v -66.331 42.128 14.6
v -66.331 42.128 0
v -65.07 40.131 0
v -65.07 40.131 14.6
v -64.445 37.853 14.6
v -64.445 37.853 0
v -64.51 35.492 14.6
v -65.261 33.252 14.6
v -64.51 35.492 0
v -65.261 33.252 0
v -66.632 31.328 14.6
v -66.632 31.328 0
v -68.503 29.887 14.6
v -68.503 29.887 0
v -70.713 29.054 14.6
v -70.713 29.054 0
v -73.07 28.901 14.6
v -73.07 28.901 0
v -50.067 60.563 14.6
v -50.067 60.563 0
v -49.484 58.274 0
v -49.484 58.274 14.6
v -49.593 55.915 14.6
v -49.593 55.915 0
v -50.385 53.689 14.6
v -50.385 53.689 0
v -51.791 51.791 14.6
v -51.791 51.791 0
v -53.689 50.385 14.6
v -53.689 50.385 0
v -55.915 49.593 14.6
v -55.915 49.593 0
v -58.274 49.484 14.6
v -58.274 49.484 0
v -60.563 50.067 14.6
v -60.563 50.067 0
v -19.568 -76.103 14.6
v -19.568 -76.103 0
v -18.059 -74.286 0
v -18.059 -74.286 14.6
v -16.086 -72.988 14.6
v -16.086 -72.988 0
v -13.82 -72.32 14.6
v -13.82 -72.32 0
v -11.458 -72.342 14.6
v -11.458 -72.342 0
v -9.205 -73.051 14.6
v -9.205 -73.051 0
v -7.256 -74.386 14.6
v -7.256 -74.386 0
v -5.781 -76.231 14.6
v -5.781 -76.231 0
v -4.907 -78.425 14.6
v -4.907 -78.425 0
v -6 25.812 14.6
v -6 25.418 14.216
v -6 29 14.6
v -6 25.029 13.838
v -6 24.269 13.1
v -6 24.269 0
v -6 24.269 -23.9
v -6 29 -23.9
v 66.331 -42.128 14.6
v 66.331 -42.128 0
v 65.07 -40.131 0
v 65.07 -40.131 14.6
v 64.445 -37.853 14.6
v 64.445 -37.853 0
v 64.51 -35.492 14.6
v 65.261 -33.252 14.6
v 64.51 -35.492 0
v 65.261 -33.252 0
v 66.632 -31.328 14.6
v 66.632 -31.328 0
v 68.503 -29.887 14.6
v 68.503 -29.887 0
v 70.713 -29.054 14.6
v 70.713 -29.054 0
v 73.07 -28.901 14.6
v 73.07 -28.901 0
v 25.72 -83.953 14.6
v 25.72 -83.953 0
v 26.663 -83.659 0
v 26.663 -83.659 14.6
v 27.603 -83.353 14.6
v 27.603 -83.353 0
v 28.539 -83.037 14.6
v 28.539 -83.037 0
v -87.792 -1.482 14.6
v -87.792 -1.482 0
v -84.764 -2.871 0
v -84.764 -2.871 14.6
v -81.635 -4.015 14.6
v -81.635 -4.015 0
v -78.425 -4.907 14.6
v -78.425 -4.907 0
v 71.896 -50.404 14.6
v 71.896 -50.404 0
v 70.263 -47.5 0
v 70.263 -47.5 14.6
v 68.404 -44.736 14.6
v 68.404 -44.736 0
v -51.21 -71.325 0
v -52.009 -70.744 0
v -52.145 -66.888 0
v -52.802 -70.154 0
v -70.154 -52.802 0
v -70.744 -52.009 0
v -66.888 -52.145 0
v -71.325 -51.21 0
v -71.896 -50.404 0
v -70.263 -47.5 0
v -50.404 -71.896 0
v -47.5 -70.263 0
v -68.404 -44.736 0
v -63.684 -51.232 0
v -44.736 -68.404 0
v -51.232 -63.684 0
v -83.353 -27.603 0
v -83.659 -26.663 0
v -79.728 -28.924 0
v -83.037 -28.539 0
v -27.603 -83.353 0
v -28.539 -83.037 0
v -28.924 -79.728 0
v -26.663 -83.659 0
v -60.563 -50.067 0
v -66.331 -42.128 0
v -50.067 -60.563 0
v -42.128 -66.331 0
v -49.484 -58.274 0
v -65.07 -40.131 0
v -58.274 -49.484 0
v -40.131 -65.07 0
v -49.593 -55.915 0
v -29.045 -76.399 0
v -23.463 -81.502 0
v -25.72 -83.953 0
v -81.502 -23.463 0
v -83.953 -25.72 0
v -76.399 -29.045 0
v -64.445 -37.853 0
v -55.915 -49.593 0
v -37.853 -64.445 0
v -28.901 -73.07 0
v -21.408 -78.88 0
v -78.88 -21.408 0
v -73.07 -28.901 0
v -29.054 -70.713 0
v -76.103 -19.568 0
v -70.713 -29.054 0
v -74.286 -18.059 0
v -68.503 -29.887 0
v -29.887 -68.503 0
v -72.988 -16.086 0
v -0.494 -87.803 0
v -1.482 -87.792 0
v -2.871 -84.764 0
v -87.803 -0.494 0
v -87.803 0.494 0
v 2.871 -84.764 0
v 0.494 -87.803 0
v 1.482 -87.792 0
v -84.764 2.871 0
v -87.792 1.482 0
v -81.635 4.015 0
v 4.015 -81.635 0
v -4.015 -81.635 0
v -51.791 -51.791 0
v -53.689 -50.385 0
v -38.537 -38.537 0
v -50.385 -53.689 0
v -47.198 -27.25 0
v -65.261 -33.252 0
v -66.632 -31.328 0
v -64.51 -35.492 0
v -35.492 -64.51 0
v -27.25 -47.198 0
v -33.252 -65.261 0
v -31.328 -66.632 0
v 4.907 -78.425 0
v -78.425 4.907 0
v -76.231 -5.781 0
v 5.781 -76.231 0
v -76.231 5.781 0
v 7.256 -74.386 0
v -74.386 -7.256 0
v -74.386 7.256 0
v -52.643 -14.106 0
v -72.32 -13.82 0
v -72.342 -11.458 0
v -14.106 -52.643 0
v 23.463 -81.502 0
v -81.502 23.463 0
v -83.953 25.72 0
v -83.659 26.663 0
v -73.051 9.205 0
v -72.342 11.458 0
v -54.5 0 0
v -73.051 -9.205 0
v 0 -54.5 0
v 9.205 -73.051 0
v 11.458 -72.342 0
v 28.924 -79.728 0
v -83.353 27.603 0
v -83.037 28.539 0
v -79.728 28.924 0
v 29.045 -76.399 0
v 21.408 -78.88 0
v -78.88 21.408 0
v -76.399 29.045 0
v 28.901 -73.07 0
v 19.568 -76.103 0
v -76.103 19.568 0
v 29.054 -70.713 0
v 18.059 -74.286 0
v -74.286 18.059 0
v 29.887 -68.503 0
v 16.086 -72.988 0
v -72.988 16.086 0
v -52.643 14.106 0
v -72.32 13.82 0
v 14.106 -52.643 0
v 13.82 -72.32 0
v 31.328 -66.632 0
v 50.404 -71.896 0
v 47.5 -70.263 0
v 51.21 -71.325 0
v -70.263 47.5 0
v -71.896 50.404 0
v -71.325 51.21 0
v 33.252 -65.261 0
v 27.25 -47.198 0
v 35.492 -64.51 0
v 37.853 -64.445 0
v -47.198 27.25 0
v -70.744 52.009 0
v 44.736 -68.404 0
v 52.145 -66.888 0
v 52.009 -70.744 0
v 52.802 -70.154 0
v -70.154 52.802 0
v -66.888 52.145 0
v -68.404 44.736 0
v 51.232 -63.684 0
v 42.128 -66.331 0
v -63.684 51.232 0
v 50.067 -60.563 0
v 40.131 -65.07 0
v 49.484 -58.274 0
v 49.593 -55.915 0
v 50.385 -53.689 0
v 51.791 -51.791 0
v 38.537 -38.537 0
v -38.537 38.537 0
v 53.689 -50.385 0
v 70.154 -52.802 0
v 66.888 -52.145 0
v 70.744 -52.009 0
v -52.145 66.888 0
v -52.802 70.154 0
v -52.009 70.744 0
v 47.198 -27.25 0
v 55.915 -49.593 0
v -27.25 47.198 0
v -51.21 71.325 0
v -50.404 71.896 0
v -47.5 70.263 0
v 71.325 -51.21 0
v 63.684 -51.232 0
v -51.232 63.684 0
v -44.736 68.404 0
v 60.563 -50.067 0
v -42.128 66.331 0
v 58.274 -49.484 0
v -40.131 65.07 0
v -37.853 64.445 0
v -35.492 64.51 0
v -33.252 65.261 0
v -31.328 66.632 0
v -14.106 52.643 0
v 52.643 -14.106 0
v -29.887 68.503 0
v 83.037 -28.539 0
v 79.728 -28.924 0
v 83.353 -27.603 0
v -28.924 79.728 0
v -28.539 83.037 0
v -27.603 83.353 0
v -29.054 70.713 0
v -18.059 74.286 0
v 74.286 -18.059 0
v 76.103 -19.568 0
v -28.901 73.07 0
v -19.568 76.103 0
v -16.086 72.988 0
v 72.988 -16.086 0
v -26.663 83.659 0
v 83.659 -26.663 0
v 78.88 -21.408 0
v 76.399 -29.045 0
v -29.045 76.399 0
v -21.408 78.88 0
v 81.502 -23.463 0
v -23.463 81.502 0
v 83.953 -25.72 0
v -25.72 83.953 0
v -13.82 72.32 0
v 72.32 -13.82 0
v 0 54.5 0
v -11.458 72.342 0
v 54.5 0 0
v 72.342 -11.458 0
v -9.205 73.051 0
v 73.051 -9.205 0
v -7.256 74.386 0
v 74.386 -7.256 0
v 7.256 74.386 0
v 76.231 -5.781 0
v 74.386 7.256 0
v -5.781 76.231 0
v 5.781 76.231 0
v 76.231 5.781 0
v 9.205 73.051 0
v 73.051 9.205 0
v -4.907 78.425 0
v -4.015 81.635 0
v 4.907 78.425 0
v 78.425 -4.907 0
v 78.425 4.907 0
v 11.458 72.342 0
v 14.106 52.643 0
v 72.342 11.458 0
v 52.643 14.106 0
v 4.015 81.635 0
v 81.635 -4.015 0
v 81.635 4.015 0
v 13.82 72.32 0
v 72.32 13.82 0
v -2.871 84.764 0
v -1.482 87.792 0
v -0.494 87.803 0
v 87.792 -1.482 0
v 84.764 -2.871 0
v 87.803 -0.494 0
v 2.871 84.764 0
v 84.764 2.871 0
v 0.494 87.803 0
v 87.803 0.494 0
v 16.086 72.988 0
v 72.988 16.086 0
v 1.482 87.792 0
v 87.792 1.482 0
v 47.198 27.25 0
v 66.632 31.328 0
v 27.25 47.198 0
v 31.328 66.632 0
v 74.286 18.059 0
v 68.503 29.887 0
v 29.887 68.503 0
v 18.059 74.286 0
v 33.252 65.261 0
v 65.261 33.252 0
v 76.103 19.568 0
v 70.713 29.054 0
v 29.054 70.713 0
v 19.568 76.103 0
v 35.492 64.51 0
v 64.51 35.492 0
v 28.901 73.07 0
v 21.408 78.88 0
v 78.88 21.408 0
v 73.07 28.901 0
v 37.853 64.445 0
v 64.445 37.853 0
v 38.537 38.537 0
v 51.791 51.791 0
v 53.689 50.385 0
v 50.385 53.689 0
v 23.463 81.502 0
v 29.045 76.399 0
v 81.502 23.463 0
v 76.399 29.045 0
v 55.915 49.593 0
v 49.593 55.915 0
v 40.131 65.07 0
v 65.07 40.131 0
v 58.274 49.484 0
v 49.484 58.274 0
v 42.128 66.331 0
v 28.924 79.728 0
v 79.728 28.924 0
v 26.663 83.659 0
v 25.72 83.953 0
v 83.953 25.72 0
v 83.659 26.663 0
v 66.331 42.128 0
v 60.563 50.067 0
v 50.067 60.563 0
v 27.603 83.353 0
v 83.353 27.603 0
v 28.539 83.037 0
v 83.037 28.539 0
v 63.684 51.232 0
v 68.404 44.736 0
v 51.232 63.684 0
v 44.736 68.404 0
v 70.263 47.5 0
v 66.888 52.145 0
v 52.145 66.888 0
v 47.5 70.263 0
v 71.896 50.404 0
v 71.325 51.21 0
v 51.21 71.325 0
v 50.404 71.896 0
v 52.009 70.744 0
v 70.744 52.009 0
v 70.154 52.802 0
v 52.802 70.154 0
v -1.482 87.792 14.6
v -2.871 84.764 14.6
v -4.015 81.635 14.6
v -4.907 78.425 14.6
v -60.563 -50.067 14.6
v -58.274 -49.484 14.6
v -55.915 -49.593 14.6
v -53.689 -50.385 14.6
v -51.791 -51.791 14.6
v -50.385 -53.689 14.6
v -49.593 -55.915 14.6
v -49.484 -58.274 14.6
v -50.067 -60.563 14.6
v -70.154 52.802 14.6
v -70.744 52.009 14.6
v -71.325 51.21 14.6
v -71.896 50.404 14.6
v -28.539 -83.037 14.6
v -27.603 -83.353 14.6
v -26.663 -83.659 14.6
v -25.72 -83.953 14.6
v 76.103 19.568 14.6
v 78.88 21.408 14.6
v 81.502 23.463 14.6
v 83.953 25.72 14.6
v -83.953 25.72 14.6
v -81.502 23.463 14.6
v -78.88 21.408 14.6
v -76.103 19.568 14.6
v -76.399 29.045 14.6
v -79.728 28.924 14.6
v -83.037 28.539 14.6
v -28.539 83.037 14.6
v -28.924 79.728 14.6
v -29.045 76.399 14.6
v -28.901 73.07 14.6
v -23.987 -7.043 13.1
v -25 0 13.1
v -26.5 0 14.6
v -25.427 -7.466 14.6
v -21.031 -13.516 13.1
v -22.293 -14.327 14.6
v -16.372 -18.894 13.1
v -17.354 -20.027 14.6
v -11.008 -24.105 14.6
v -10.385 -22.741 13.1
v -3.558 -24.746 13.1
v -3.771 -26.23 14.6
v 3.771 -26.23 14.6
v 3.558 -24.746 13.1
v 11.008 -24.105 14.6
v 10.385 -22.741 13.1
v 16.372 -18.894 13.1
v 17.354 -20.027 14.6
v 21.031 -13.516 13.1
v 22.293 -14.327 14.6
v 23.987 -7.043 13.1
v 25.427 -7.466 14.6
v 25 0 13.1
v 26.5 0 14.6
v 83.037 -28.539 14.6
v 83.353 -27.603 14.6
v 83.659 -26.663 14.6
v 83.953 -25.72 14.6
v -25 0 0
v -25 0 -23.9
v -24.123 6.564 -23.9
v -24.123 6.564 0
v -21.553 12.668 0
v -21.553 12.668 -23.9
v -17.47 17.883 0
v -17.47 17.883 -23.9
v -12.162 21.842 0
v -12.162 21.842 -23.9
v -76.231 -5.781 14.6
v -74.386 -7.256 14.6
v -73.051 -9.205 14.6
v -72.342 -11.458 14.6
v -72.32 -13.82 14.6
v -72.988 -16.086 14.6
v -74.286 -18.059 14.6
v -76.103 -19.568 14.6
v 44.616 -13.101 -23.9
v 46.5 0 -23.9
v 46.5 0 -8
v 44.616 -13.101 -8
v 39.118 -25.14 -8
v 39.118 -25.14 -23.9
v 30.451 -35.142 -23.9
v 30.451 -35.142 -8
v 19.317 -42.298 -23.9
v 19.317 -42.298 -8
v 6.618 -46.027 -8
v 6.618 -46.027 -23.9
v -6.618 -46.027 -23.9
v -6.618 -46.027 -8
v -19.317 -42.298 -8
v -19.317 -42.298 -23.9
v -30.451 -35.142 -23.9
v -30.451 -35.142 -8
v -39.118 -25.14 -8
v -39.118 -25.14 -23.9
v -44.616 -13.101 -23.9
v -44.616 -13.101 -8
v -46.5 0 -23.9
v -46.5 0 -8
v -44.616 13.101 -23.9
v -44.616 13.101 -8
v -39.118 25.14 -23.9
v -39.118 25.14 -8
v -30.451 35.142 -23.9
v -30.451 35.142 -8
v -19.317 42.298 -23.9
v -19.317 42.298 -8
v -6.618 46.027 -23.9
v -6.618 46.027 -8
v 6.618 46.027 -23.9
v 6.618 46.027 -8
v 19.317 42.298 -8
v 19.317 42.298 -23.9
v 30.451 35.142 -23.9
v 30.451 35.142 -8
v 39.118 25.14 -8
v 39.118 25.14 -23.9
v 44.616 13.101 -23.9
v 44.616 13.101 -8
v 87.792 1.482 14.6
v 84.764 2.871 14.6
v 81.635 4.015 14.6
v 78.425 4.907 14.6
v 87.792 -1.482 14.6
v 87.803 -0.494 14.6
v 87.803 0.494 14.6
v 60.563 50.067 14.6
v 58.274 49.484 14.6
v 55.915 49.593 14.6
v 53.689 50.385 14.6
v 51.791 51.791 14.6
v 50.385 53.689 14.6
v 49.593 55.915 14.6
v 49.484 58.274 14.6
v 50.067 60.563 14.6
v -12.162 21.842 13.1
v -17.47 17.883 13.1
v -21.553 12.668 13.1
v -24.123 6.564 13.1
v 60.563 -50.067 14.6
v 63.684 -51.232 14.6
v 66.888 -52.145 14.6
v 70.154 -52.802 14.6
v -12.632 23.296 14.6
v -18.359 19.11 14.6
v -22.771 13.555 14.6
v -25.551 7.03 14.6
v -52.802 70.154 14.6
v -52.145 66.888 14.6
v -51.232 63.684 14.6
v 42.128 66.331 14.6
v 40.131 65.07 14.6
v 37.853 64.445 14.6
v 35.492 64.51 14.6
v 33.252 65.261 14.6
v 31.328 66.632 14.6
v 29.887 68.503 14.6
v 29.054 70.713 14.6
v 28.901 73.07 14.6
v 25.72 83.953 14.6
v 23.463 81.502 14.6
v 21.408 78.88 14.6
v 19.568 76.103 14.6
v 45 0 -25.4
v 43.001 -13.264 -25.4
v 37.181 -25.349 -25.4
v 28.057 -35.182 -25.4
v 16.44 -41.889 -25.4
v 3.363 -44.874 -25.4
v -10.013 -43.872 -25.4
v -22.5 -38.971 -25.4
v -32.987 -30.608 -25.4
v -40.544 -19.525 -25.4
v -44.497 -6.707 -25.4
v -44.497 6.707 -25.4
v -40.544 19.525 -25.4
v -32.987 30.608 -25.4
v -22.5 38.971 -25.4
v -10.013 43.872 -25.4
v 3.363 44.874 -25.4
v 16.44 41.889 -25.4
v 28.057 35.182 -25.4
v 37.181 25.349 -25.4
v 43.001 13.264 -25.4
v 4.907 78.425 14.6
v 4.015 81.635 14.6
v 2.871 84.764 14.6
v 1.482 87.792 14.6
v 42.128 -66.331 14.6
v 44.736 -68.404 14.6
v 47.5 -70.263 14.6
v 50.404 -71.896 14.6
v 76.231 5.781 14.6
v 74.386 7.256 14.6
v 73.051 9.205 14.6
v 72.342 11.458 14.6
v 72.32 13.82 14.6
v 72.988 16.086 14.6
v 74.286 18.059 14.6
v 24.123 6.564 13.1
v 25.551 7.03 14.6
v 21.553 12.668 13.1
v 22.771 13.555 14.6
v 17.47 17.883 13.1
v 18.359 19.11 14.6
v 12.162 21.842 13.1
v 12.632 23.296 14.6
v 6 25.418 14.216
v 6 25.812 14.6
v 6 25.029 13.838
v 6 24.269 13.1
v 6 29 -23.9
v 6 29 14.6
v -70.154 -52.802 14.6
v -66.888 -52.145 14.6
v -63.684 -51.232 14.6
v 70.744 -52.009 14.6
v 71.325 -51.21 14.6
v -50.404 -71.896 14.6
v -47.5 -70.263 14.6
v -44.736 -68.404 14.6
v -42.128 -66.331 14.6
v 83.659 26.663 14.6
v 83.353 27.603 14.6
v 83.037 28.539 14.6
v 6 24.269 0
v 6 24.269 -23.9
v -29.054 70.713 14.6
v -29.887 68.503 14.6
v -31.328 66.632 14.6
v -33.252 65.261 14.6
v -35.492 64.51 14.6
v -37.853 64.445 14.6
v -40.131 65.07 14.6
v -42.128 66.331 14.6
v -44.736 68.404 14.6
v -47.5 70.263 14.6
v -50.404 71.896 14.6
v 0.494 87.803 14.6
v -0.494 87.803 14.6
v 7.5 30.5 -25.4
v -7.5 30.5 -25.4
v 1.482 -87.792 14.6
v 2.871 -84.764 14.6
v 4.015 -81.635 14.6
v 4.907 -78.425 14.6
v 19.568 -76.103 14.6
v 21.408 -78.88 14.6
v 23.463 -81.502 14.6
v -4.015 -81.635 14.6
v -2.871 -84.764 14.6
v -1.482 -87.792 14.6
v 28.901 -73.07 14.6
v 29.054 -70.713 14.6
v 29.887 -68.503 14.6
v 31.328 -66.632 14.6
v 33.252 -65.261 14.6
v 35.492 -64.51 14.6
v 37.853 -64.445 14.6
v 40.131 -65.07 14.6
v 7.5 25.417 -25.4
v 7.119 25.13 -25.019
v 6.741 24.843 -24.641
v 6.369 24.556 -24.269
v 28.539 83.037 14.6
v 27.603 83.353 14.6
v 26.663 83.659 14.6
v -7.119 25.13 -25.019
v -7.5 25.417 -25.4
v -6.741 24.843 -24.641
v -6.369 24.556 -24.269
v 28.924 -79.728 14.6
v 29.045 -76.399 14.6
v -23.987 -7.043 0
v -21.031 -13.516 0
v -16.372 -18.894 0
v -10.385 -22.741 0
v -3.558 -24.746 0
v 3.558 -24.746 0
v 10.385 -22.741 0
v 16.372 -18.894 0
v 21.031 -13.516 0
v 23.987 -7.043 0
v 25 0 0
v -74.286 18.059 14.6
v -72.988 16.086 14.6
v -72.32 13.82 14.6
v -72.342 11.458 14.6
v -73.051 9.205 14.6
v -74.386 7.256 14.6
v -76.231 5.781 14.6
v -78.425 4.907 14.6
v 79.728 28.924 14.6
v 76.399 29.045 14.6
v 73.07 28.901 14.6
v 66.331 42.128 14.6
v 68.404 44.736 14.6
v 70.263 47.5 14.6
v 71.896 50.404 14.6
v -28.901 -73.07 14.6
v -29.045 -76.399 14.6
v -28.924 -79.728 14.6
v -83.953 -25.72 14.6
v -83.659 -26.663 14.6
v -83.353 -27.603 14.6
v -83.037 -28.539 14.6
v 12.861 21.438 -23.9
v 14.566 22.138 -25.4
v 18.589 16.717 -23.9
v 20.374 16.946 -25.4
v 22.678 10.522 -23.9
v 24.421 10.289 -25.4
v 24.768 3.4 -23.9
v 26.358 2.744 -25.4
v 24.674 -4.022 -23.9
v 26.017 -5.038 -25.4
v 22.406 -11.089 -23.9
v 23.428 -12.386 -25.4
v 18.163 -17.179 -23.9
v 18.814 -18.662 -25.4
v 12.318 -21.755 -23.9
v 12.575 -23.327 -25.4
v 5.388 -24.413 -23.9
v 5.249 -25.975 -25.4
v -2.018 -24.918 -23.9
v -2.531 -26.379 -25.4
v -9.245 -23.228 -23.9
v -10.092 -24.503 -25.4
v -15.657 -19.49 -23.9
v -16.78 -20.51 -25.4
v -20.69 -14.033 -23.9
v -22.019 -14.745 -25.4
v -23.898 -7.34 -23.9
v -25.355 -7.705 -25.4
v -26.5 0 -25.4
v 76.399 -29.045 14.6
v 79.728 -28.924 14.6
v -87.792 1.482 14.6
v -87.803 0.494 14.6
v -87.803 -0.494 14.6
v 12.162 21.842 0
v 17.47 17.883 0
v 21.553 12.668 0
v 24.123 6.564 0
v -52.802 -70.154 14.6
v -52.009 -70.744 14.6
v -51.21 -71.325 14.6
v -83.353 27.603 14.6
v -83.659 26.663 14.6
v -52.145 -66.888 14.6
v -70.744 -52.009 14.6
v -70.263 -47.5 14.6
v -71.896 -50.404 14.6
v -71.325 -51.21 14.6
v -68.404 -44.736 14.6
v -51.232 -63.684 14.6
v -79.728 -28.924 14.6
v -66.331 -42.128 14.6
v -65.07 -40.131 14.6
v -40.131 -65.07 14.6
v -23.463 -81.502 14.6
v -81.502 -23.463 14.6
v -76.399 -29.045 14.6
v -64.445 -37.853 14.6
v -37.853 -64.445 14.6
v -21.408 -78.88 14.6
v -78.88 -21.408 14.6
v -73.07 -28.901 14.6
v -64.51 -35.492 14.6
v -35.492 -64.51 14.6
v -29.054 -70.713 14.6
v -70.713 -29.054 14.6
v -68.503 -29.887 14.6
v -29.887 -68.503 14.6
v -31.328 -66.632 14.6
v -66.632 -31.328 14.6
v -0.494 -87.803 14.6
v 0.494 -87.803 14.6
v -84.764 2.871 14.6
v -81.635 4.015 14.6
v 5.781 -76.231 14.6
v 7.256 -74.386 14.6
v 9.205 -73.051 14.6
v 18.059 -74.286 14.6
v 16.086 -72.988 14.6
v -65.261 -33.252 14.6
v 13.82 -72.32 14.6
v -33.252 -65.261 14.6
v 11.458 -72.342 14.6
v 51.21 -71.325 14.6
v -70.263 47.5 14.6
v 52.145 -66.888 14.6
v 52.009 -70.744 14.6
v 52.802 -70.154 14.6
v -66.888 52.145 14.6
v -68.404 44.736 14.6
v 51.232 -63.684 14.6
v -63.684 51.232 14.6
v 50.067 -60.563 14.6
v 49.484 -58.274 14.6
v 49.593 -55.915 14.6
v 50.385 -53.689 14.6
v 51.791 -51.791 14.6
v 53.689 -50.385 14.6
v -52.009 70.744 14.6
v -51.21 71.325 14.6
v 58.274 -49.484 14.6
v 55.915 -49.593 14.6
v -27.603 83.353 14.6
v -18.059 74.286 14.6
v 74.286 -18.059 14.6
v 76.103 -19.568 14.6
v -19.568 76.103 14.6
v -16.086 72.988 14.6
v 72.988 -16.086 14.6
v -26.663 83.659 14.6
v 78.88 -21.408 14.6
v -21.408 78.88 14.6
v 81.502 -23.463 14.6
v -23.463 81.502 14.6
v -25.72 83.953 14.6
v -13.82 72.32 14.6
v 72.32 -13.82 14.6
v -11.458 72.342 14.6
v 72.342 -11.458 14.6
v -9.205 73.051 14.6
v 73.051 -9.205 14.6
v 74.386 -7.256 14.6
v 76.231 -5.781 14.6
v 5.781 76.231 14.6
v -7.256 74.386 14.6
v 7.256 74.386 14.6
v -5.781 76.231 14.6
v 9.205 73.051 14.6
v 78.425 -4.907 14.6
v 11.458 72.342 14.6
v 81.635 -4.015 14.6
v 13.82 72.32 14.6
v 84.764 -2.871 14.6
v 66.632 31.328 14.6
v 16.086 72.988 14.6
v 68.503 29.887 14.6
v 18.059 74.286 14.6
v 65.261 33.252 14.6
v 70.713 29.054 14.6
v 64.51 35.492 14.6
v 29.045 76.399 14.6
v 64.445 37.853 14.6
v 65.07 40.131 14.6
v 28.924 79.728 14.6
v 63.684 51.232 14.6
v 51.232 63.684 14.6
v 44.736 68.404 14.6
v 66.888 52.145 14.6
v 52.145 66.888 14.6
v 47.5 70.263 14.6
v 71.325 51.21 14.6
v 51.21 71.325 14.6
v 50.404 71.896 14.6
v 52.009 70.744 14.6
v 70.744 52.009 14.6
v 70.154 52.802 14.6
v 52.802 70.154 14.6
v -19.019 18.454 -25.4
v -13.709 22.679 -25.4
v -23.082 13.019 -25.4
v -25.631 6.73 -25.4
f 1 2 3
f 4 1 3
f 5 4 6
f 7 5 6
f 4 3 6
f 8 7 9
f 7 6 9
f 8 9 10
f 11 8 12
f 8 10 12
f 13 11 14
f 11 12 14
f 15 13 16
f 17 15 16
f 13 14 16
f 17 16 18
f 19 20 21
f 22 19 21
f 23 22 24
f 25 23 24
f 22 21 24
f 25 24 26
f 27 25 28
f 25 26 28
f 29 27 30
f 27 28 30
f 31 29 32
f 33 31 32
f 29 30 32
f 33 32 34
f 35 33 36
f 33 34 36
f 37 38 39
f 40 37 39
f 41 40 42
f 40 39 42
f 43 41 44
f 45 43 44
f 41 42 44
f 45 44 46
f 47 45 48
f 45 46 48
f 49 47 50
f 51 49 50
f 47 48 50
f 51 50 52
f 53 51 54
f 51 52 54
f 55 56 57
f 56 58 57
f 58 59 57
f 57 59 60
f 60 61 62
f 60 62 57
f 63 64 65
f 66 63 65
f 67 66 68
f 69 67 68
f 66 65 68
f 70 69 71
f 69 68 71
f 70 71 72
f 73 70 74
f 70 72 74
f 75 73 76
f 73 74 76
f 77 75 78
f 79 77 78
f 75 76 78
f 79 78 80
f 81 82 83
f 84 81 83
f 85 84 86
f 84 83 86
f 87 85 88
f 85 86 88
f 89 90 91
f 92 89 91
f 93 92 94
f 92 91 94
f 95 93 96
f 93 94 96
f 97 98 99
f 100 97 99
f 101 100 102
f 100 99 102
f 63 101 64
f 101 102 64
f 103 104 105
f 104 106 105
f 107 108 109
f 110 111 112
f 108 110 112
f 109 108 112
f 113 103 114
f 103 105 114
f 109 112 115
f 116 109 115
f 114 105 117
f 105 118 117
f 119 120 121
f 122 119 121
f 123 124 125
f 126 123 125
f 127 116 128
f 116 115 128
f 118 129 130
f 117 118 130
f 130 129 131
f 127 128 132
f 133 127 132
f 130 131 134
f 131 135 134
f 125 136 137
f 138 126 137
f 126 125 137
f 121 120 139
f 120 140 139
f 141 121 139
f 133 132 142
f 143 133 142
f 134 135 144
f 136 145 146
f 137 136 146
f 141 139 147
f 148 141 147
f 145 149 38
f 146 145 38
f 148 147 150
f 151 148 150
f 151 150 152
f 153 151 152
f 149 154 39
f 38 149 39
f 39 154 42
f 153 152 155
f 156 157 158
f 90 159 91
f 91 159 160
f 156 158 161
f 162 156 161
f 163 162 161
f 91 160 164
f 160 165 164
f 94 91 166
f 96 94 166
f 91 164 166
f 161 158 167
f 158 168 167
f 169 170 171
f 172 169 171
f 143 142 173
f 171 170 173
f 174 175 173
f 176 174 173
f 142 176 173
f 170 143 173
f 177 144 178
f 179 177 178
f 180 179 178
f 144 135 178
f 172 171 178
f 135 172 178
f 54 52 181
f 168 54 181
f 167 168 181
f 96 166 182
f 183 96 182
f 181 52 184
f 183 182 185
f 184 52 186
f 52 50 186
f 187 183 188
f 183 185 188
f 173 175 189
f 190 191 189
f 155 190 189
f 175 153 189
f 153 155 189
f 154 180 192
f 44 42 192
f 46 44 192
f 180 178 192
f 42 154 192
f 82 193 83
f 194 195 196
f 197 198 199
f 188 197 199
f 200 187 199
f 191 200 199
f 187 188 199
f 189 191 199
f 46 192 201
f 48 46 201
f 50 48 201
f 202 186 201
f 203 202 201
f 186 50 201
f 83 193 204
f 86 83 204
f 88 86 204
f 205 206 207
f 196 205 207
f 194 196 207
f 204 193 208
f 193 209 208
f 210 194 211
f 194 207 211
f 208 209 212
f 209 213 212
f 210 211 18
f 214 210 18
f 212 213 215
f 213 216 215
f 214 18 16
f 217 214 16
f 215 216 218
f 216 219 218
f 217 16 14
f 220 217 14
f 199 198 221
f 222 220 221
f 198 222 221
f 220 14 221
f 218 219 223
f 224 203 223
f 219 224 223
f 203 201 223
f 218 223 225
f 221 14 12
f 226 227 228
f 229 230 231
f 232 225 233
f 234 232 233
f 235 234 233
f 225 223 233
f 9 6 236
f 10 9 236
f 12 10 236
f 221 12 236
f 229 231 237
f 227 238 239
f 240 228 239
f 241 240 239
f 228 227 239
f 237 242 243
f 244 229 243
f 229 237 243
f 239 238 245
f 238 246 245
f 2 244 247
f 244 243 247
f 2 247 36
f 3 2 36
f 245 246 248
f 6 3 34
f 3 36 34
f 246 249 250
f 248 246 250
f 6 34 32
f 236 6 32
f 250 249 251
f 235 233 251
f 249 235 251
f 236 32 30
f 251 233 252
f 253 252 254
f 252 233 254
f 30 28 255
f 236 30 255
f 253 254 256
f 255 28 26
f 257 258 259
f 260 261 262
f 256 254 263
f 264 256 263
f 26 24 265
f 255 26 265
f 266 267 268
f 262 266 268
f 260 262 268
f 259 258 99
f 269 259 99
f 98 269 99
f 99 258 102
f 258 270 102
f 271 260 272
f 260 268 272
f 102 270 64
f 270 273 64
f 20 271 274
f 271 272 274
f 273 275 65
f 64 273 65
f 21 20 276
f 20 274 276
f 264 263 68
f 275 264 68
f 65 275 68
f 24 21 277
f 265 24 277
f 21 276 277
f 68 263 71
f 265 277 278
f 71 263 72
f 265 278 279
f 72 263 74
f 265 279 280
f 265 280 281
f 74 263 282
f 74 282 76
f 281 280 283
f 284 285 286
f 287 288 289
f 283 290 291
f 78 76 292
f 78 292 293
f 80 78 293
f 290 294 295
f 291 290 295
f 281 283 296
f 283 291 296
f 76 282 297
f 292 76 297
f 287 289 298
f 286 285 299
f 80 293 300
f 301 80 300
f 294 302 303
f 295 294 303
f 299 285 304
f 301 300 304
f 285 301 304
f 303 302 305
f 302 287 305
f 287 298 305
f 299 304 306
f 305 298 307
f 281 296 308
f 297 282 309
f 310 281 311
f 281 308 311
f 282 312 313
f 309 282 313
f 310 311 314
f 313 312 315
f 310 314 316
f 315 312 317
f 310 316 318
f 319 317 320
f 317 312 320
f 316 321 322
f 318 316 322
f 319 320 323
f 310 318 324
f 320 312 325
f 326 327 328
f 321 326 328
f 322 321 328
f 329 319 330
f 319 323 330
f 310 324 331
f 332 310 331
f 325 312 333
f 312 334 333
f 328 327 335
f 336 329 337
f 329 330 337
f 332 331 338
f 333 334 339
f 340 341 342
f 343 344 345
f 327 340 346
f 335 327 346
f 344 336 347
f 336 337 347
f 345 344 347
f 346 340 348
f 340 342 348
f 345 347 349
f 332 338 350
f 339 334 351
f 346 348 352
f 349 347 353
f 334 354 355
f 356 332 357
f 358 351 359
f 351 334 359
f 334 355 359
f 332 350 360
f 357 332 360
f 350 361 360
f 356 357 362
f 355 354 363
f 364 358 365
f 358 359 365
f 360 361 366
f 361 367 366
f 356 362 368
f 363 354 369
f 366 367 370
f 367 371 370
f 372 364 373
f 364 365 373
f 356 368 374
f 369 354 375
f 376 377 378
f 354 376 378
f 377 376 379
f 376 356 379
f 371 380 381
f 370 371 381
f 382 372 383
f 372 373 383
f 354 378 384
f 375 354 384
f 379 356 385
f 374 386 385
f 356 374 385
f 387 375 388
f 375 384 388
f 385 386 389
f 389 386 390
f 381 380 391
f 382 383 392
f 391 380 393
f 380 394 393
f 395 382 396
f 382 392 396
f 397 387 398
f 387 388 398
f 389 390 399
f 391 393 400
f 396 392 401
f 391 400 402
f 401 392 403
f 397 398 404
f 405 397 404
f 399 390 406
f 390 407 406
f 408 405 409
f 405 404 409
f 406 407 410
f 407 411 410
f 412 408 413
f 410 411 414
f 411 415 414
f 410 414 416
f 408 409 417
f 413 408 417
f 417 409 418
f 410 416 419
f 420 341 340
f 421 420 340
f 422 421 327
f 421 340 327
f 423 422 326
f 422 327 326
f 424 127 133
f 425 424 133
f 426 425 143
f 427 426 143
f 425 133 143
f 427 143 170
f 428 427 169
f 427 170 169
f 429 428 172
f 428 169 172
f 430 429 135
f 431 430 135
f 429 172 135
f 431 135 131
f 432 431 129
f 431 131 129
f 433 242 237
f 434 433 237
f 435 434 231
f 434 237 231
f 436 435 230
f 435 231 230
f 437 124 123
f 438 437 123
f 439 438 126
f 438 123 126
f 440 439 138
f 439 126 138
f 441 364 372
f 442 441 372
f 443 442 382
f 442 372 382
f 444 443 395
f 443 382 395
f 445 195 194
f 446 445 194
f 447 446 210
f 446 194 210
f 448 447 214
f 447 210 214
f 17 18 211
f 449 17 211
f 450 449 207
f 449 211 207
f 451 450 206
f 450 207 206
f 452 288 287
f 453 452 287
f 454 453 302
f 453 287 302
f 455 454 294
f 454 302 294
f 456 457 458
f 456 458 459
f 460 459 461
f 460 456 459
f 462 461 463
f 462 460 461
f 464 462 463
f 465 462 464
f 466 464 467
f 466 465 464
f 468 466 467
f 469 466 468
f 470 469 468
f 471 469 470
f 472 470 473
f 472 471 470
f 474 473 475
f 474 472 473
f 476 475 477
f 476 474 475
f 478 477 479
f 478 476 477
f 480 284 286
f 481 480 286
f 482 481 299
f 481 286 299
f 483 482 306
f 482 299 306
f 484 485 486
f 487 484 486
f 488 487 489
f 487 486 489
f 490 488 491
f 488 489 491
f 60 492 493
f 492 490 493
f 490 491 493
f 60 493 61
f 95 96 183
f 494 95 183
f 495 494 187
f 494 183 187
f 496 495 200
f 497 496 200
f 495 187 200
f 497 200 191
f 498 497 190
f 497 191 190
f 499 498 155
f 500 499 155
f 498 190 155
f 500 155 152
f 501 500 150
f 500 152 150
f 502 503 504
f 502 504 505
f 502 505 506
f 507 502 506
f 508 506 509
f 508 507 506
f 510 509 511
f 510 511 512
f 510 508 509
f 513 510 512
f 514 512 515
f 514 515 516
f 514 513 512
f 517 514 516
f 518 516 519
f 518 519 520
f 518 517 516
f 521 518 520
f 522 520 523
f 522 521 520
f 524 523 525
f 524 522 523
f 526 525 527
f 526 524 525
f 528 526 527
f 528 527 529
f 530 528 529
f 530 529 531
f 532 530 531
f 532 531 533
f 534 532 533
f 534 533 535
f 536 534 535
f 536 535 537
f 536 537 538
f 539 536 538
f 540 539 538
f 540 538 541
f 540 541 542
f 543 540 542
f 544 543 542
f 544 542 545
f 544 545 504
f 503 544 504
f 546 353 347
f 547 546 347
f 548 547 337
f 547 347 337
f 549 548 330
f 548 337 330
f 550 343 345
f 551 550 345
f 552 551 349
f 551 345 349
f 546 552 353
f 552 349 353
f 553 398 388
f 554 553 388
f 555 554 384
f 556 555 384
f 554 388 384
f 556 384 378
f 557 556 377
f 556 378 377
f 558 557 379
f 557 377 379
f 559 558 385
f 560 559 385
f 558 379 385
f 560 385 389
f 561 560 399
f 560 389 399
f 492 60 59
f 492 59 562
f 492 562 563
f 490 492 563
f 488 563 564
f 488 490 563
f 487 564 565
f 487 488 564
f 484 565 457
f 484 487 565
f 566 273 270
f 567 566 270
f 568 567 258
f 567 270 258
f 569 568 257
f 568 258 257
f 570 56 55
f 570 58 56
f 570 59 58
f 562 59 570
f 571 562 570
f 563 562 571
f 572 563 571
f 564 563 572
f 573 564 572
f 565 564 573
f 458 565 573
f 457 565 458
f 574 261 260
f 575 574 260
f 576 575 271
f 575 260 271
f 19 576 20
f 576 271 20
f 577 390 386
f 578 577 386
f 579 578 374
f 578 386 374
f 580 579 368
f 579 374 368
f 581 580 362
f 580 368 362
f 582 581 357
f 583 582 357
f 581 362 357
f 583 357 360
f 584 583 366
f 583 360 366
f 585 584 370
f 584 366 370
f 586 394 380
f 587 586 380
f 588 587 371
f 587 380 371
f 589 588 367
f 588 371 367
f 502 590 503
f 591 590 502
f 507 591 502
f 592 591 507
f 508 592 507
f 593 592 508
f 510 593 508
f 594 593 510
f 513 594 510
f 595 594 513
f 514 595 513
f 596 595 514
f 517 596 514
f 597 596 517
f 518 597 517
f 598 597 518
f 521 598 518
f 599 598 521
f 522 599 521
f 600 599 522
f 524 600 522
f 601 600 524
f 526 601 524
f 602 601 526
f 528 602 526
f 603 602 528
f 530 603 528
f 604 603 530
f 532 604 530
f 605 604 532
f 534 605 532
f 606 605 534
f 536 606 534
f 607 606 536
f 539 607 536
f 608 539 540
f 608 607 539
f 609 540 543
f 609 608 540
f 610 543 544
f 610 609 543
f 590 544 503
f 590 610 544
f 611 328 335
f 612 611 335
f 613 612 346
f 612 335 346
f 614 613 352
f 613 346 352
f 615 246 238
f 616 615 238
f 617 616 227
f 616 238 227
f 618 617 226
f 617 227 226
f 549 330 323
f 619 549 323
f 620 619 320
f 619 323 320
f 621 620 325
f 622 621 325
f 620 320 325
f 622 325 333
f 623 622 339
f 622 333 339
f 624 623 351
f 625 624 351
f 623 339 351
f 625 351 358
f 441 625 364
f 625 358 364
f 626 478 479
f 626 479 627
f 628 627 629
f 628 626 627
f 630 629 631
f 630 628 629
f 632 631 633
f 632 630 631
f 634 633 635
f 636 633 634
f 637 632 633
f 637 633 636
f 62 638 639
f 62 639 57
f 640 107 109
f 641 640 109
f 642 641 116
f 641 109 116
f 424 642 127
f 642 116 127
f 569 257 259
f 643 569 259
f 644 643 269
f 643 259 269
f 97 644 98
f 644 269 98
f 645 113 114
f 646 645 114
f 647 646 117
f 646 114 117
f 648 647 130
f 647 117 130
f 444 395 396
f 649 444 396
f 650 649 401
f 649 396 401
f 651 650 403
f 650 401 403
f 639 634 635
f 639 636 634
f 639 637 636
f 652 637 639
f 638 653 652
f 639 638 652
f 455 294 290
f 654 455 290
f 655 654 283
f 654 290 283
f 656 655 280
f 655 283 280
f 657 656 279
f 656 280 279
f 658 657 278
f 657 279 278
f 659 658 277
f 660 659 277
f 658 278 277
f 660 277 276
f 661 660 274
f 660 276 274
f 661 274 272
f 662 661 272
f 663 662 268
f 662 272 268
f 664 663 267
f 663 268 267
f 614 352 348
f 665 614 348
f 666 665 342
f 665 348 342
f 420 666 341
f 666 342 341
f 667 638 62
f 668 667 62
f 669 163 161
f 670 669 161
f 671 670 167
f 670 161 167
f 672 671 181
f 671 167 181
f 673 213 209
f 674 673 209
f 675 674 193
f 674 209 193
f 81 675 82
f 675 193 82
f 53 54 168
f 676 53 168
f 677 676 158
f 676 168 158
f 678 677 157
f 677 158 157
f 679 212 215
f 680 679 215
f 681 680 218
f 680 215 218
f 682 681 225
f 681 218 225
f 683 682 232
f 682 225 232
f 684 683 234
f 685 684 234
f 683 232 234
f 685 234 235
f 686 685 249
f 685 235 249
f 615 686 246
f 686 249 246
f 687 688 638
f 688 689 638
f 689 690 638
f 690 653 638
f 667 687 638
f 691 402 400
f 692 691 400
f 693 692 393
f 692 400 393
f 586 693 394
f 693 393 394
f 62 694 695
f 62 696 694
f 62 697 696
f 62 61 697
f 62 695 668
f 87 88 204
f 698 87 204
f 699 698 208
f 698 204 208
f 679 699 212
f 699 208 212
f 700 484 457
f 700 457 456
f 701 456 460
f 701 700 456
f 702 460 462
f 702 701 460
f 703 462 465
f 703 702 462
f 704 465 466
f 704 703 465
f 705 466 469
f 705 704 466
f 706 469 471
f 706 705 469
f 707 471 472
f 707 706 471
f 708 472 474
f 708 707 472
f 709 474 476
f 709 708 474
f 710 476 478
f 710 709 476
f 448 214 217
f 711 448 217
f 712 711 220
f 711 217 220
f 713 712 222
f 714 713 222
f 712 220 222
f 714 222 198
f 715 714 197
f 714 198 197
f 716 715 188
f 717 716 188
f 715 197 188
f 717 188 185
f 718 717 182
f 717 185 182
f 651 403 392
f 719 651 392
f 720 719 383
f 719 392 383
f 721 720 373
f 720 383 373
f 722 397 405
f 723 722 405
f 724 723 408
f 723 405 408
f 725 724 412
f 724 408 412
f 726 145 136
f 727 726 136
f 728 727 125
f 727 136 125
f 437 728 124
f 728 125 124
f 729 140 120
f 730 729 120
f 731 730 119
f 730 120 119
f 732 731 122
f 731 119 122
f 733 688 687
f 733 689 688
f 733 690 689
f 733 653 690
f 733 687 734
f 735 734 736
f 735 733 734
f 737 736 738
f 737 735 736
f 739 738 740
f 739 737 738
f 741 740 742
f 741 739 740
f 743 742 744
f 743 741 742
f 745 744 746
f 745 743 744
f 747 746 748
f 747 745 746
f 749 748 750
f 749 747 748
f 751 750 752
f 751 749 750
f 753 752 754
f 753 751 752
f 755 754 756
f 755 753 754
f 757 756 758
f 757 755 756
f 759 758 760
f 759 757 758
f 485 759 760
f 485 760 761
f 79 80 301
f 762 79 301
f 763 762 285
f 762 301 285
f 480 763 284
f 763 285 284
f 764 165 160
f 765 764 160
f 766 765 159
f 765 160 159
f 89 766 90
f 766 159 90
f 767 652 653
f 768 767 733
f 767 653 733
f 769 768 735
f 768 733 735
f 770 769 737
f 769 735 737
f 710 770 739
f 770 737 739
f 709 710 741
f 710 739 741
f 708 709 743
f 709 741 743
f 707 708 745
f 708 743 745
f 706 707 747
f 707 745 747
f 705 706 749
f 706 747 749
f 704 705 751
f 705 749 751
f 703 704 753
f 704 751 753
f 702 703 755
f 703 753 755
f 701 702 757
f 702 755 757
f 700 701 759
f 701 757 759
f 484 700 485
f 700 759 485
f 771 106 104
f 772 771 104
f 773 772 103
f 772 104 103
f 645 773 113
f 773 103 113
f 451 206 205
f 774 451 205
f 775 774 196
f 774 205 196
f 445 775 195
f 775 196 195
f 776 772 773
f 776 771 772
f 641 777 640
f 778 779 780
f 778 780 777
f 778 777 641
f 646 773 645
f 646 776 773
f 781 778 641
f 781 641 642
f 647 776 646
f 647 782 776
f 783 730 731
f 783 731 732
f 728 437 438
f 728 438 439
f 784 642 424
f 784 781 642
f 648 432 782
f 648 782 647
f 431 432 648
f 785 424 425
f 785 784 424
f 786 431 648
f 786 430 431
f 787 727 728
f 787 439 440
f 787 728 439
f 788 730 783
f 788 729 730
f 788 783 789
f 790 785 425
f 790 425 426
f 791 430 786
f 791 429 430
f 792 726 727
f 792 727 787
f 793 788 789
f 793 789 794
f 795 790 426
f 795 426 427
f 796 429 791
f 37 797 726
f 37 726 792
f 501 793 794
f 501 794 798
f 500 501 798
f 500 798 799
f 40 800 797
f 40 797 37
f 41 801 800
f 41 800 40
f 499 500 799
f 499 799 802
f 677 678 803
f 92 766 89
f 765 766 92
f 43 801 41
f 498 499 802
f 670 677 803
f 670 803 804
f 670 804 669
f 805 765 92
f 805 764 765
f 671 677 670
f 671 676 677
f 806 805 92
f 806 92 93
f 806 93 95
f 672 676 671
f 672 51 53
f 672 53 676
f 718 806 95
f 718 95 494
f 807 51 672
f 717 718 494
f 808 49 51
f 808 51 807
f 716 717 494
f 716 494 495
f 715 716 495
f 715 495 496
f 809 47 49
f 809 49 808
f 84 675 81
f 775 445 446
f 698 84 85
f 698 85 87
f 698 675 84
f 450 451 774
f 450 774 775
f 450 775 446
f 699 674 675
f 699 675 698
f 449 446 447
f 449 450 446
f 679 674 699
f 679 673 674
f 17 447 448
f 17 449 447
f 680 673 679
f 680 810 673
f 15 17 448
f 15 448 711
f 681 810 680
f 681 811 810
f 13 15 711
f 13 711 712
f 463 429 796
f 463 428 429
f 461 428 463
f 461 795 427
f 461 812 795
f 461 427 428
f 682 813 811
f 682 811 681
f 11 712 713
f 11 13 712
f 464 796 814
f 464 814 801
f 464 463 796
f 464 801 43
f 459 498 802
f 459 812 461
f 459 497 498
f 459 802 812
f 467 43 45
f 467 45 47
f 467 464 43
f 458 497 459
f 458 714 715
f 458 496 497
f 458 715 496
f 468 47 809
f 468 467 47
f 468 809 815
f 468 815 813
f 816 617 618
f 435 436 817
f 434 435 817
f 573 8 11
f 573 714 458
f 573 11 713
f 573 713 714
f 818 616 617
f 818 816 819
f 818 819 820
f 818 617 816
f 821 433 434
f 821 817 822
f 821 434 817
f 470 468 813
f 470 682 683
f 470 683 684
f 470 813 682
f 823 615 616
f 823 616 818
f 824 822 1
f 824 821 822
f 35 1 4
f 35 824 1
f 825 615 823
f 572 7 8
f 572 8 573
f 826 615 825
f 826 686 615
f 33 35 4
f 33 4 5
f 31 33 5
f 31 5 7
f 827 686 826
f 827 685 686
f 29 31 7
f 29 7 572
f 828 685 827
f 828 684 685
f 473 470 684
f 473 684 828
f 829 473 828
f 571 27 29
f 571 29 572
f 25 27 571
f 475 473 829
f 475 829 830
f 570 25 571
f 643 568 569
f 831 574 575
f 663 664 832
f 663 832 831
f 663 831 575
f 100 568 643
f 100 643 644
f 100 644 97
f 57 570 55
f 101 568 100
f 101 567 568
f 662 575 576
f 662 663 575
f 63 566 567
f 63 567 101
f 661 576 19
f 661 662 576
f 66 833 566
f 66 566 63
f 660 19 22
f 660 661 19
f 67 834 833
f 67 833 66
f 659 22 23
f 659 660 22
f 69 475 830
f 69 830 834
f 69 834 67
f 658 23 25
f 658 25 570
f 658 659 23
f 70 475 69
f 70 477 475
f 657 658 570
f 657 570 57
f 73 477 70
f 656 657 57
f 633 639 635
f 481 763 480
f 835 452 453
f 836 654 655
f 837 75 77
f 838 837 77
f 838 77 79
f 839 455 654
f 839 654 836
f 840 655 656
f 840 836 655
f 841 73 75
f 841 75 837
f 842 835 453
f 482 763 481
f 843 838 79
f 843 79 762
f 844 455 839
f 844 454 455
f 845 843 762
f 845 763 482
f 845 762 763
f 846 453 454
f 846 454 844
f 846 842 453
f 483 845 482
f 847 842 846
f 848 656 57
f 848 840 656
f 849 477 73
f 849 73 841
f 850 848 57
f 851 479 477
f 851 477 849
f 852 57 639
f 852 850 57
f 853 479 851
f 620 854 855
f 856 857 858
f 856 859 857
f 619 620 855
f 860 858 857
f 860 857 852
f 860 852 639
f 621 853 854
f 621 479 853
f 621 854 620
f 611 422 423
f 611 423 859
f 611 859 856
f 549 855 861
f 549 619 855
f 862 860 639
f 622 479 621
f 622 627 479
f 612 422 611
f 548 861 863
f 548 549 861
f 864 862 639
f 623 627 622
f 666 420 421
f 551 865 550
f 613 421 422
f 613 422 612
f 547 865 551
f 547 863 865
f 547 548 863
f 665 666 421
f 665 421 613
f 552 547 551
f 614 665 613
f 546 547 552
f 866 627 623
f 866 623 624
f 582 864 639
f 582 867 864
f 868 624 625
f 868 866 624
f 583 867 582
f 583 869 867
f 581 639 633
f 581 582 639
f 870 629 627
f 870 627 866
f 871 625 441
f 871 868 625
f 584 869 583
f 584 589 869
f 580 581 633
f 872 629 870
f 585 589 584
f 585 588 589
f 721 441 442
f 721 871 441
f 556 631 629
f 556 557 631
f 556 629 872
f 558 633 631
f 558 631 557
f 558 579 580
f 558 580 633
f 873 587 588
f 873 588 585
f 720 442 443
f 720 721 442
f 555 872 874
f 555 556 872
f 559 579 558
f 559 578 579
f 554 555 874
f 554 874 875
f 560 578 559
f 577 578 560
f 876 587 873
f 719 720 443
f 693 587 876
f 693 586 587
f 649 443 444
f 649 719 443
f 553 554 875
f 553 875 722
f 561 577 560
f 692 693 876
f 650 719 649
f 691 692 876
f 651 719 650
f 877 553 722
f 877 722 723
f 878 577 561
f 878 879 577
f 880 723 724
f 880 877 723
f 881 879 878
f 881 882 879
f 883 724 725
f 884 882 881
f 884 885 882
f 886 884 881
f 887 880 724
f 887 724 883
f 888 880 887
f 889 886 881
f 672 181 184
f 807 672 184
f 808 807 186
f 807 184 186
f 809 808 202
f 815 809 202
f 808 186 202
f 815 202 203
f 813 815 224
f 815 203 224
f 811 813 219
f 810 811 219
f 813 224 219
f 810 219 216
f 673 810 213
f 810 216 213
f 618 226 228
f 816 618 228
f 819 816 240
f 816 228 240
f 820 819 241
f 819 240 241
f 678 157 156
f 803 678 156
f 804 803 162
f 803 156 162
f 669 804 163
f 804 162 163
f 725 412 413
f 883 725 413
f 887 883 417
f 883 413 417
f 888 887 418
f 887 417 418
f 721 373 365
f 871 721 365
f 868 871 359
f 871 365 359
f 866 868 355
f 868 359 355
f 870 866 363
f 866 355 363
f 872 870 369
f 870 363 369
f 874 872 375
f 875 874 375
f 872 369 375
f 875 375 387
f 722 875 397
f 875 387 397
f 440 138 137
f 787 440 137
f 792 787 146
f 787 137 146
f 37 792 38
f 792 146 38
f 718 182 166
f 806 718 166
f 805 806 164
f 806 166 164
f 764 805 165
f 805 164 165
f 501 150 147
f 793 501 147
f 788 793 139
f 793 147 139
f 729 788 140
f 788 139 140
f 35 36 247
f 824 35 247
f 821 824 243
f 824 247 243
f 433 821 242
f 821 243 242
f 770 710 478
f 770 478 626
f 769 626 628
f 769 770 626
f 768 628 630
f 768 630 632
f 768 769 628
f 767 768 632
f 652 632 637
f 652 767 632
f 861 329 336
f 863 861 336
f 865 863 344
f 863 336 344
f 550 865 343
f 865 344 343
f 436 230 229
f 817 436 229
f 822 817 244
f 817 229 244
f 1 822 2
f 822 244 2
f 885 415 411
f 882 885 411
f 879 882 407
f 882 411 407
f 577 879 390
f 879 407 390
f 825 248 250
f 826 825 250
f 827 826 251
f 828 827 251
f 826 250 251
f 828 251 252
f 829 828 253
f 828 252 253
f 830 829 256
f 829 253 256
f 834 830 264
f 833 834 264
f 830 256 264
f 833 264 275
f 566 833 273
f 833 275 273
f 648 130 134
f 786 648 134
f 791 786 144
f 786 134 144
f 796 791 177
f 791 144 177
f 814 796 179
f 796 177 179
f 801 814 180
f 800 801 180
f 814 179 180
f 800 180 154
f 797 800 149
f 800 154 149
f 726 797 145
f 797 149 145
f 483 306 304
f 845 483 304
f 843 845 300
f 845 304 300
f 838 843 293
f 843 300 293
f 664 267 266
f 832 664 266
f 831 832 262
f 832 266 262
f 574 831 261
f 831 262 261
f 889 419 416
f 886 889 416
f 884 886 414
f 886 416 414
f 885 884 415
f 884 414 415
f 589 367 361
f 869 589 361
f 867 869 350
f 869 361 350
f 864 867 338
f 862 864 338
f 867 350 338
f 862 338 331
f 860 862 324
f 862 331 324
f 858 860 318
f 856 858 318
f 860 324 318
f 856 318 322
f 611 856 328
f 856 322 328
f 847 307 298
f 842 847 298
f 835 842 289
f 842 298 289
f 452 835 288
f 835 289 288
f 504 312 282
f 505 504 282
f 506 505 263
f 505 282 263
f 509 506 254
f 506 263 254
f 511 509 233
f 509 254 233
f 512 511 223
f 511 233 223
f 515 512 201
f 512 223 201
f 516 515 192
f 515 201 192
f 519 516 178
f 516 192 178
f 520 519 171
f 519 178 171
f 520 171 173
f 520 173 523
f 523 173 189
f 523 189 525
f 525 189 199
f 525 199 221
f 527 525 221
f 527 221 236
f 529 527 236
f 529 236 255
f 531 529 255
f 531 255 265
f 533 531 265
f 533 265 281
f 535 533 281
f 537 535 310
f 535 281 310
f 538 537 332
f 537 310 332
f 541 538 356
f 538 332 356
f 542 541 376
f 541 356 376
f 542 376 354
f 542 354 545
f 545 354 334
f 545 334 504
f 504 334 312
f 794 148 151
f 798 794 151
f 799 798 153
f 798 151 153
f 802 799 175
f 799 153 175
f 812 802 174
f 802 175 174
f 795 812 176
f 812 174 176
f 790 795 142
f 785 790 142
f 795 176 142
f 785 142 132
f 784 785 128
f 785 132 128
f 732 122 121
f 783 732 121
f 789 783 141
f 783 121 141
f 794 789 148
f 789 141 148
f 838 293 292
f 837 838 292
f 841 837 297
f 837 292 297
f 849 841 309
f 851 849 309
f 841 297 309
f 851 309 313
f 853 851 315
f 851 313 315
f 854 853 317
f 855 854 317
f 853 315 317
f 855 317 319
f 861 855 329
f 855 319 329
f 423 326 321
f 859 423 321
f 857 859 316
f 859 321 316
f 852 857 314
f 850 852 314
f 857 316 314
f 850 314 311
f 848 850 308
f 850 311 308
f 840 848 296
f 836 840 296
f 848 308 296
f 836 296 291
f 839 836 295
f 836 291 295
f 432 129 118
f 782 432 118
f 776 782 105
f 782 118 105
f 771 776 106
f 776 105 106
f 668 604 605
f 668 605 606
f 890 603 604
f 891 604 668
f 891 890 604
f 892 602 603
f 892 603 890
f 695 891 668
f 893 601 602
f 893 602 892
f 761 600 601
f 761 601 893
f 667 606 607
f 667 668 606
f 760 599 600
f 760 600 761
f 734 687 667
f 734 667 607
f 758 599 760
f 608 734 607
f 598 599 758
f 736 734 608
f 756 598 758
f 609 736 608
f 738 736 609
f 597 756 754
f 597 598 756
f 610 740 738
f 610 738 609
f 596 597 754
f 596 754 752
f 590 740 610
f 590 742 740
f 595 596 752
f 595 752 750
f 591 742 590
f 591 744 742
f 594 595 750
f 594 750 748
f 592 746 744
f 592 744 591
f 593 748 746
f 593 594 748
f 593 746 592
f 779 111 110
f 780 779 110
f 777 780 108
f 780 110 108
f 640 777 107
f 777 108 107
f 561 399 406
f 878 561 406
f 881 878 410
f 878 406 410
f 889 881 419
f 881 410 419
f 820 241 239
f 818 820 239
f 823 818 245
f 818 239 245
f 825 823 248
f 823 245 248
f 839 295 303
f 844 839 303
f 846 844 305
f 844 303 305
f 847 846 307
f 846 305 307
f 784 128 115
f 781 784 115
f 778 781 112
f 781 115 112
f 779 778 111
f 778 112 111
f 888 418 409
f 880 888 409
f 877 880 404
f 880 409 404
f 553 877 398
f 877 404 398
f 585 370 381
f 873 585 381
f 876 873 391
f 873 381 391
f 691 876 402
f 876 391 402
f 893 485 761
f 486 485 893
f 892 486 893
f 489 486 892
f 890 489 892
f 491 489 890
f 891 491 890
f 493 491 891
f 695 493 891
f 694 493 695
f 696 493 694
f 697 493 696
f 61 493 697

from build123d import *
from build123d.topology import SkipClean

# Parameters (mm, degrees)
SKETCH2_R           = 25
BOSS_EXTRUDE1_DEPTH = 14.6
BOSS_EXTRUDE2_START = 40
SKETCH3_R           = 46.5
SKETCH3_R_2         = 25
BOSS_EXTRUDE2_DEPTH = 40
SKETCH6_W           = 12
SKETCH6_H           = 17.793467461
CUT_EXTRUDE1_DEPTH  = 64
CHAMFER1_SIZE       = 1.5
CHAMFER2_SIZE       = 8


with BuildPart() as part:
    # Sketch2 → Boss-Extrude1 (new body)
    with BuildSketch(Plane.XY):
        with BuildLine():
            ThreePointArc((-52.801936247, 70.154195014), (-51.720450563, 65.277064388), (-50.066512977, 60.563201335))
            ThreePointArc((-50.066512977, 60.563201335), (-51.791439328, 51.791439328), (-60.563201335, 50.066512977))
            ThreePointArc((-60.563201335, 50.066512977), (-65.277064388, 51.720450563), (-70.154195014, 52.801936247))
            ThreePointArc((-70.154195014, 52.801936247), (-71.035449372, 51.610274965), (-71.896464027, 50.403908677))
            ThreePointArc((-71.896464027, 50.403908677), (-69.360793773, 46.09967927), (-66.331141862, 42.127623919))
            ThreePointArc((-66.331141862, 42.127623919), (-65.261020777, 33.252150946), (-73.070430637, 28.901024969))
            ThreePointArc((-73.070430637, 28.901024969), (-78.064675632, 29.017349295), (-83.03729995, 28.538787055))
            ThreePointArc((-83.03729995, 28.538787055), (-83.507179062, 27.133127254), (-83.953264975, 25.719736574))
            ThreePointArc((-83.953264975, 25.719736574), (-80.211619223, 22.40973635), (-76.102816424, 19.568301152))
            ThreePointArc((-76.102816424, 19.568301152), (-72.342398812, 11.457910348), (-78.425017076, 4.906503271))
            ThreePointArc((-78.425017076, 4.906503271), (-83.210772516, 3.473827702), (-87.792135411, 1.482062544))
            ThreePointArc((-87.792135411, 1.482062544), (-87.804644236, 0), (-87.792135411, -1.482062544))
            ThreePointArc((-87.792135411, -1.482062544), (-83.210772516, -3.473827702), (-78.425017076, -4.906503271))
            ThreePointArc((-78.425017076, -4.906503271), (-72.342398812, -11.457910348), (-76.102816424, -19.568301152))
            ThreePointArc((-76.102816424, -19.568301152), (-80.211619223, -22.40973635), (-83.953264975, -25.719736574))
            ThreePointArc((-83.953264975, -25.719736574), (-83.507179062, -27.133127254), (-83.03729995, -28.538787055))
            ThreePointArc((-83.03729995, -28.538787055), (-78.064675632, -29.017349295), (-73.070430637, -28.901024969))
            ThreePointArc((-73.070430637, -28.901024969), (-65.261020777, -33.252150946), (-66.331141862, -42.127623918))
            ThreePointArc((-66.331141862, -42.127623918), (-69.360793773, -46.09967927), (-71.896464027, -50.403908677))
            ThreePointArc((-71.896464027, -50.403908677), (-71.035449372, -51.610274965), (-70.154195014, -52.801936247))
            ThreePointArc((-70.154195014, -52.801936247), (-65.277064388, -51.720450563), (-60.563201335, -50.066512977))
            ThreePointArc((-60.563201335, -50.066512977), (-51.791439328, -51.791439328), (-50.066512977, -60.563201335))
            ThreePointArc((-50.066512977, -60.563201335), (-51.720450563, -65.277064388), (-52.801936247, -70.154195014))
            ThreePointArc((-52.801936247, -70.154195014), (-51.610274965, -71.035449372), (-50.403908677, -71.896464027))
            ThreePointArc((-50.403908677, -71.896464027), (-46.09967927, -69.360793773), (-42.127623918, -66.331141861))
            ThreePointArc((-42.127623918, -66.331141861), (-33.252150946, -65.261020777), (-28.901024969, -73.070430637))
            ThreePointArc((-28.901024969, -73.070430637), (-29.017349295, -78.064675632), (-28.538787055, -83.03729995))
            ThreePointArc((-28.538787055, -83.03729995), (-27.133127254, -83.507179062), (-25.719736574, -83.953264975))
            ThreePointArc((-25.719736574, -83.953264975), (-22.40973635, -80.211619223), (-19.568301152, -76.102816424))
            ThreePointArc((-19.568301152, -76.102816424), (-11.457910348, -72.342398812), (-4.906503271, -78.425017076))
            ThreePointArc((-4.906503271, -78.425017076), (-3.473827702, -83.210772516), (-1.482062544, -87.792135411))
            ThreePointArc((-1.482062544, -87.792135411), (0, -87.804644236), (1.482062544, -87.792135411))
            ThreePointArc((1.482062544, -87.792135411), (3.473827702, -83.210772516), (4.906503271, -78.425017076))
            ThreePointArc((4.906503271, -78.425017076), (11.457910348, -72.342398812), (19.568301152, -76.102816424))
            ThreePointArc((19.568301152, -76.102816424), (22.40973635, -80.211619223), (25.719736574, -83.953264975))
            ThreePointArc((25.719736574, -83.953264975), (27.133127254, -83.507179062), (28.538787055, -83.03729995))
            ThreePointArc((28.538787055, -83.03729995), (29.017349295, -78.064675632), (28.901024969, -73.070430637))
            ThreePointArc((28.901024969, -73.070430637), (33.252150946, -65.261020777), (42.127623918, -66.331141861))
            ThreePointArc((42.127623918, -66.331141861), (46.09967927, -69.360793773), (50.403908677, -71.896464027))
            ThreePointArc((50.403908677, -71.896464027), (51.610274965, -71.035449372), (52.801936247, -70.154195014))
            ThreePointArc((52.801936247, -70.154195014), (51.720450563, -65.277064388), (50.066512977, -60.563201335))
            ThreePointArc((50.066512977, -60.563201335), (51.791439328, -51.791439328), (60.563201335, -50.066512977))
            ThreePointArc((60.563201335, -50.066512977), (65.277064388, -51.720450563), (70.154195014, -52.801936247))
            ThreePointArc((70.154195014, -52.801936247), (71.035449372, -51.610274965), (71.896464027, -50.403908677))
            ThreePointArc((71.896464027, -50.403908677), (69.360793773, -46.09967927), (66.331141862, -42.127623919))
            ThreePointArc((66.331141862, -42.127623919), (65.261020777, -33.252150946), (73.070430637, -28.901024969))
            ThreePointArc((73.070430637, -28.901024969), (78.064675632, -29.017349295), (83.03729995, -28.538787055))
            ThreePointArc((83.03729995, -28.538787055), (83.507179062, -27.133127254), (83.953264975, -25.719736574))
            ThreePointArc((83.953264975, -25.719736574), (80.211619223, -22.40973635), (76.102816424, -19.568301152))
            ThreePointArc((76.102816424, -19.568301152), (72.342398812, -11.457910348), (78.425017076, -4.906503271))
            ThreePointArc((78.425017076, -4.906503271), (83.210772516, -3.473827702), (87.792135411, -1.482062544))
            ThreePointArc((87.792135411, -1.482062544), (87.804644236, 0), (87.792135411, 1.482062544))
            ThreePointArc((87.792135411, 1.482062544), (83.210772516, 3.473827702), (78.425017076, 4.906503271))
            ThreePointArc((78.425017076, 4.906503271), (72.342398812, 11.457910348), (76.102816424, 19.568301152))
            ThreePointArc((76.102816424, 19.568301152), (80.211619223, 22.40973635), (83.953264975, 25.719736575))
            ThreePointArc((83.953264975, 25.719736575), (83.507179062, 27.133127254), (83.03729995, 28.538787055))
            ThreePointArc((83.03729995, 28.538787055), (78.064675632, 29.017349295), (73.070430637, 28.901024969))
            ThreePointArc((73.070430637, 28.901024969), (65.261020777, 33.252150946), (66.331141862, 42.127623918))
            ThreePointArc((66.331141862, 42.127623918), (69.360793773, 46.09967927), (71.896464027, 50.403908677))
            ThreePointArc((71.896464027, 50.403908677), (71.035449372, 51.610274965), (70.154195014, 52.801936247))
            ThreePointArc((70.154195014, 52.801936247), (65.277064388, 51.720450563), (60.563201335, 50.066512977))
            ThreePointArc((60.563201335, 50.066512977), (51.791439328, 51.791439328), (50.066512977, 60.563201335))
            ThreePointArc((50.066512977, 60.563201335), (51.720450563, 65.277064388), (52.801936247, 70.154195014))
            ThreePointArc((52.801936247, 70.154195014), (51.610274965, 71.035449372), (50.403908677, 71.896464027))
            ThreePointArc((50.403908677, 71.896464027), (46.09967927, 69.360793773), (42.127623918, 66.331141861))
            ThreePointArc((42.127623918, 66.331141861), (33.252150946, 65.261020777), (28.901024969, 73.070430637))
            ThreePointArc((28.901024969, 73.070430637), (29.017349295, 78.064675632), (28.538787055, 83.03729995))
            ThreePointArc((28.538787055, 83.03729995), (27.133127254, 83.507179062), (25.719736574, 83.953264975))
            ThreePointArc((25.719736574, 83.953264975), (22.40973635, 80.211619223), (19.568301152, 76.102816424))
            ThreePointArc((19.568301152, 76.102816424), (11.457910348, 72.342398812), (4.906503271, 78.425017076))
            ThreePointArc((4.906503271, 78.425017076), (3.473827702, 83.210772516), (1.482062544, 87.792135411))
            ThreePointArc((1.482062544, 87.792135411), (0, 87.804644236), (-1.482062544, 87.792135411))
            ThreePointArc((-1.482062544, 87.792135411), (-3.473827702, 83.210772516), (-4.906503271, 78.425017076))
            ThreePointArc((-4.906503271, 78.425017076), (-11.457910348, 72.342398812), (-19.568301152, 76.102816424))
            ThreePointArc((-19.568301152, 76.102816424), (-22.40973635, 80.211619223), (-25.719736574, 83.953264975))
            ThreePointArc((-25.719736574, 83.953264975), (-27.133127254, 83.507179062), (-28.538787055, 83.03729995))
            ThreePointArc((-28.538787055, 83.03729995), (-29.017349295, 78.064675632), (-28.901024969, 73.070430637))
            ThreePointArc((-28.901024969, 73.070430637), (-33.252150946, 65.261020777), (-42.127623918, 66.331141862))
            ThreePointArc((-42.127623918, 66.331141862), (-46.09967927, 69.360793773), (-50.403908677, 71.896464027))
            ThreePointArc((-50.403908677, 71.896464027), (-51.610274965, 71.035449372), (-52.801936247, 70.154195014))
        make_face()
        Circle(SKETCH2_R, mode=Mode.SUBTRACT)
    extrude(amount=BOSS_EXTRUDE1_DEPTH)

    # Sketch3 → Boss-Extrude2 (add)
    with SkipClean():  # the faces are left unmerged after this step: merging them gives an invalid solid
        with BuildSketch(Plane(origin=(0, 0, 14.6), x_dir=(-1, 0, 0), z_dir=(0, 0, -1)).offset(BOSS_EXTRUDE2_START)):
            Circle(SKETCH3_R)
            Circle(SKETCH3_R_2, mode=Mode.SUBTRACT)
        extrude(amount=-BOSS_EXTRUDE2_DEPTH)

    # Sketch6 → Cut-Extrude1 (cut)
    with SkipClean():  # the faces are left unmerged after this step: merging them gives an invalid solid
        with BuildSketch(Plane(origin=(0, 0, -25.4), x_dir=(-1, 0, 0), z_dir=(0, 0, -1))):
            with Locations((0, 20.10326627)):
                Rectangle(SKETCH6_W, SKETCH6_H)
        extrude(amount=-CUT_EXTRUDE1_DEPTH, mode=Mode.SUBTRACT)
    add(part.part.scale(1), mode=Mode.REPLACE)  # the faces are merged on a copy

    # Chamfer1
    chamfer1_edges = [part.edges().sort_by_distance(p)[0] for p in [
        (15.411035007, -19.685019685, -25.4),
        (46.5, 0, -25.4),
        (-6, 26.6346611, -25.4),
        (0, 29, -25.4),
        (6, 26.6346611, -25.4),
        (-15.411035007, -19.685019685, 14.6),
    ]]
    chamfer(chamfer1_edges, length=CHAMFER1_SIZE)

    # Chamfer2
    chamfer2_edges = [part.edges().sort_by_distance(p)[0] for p in [
        (46.5, 0, 0),
    ]]
    chamfer(chamfer2_edges, length=CHAMFER2_SIZE)


solid = part.part
